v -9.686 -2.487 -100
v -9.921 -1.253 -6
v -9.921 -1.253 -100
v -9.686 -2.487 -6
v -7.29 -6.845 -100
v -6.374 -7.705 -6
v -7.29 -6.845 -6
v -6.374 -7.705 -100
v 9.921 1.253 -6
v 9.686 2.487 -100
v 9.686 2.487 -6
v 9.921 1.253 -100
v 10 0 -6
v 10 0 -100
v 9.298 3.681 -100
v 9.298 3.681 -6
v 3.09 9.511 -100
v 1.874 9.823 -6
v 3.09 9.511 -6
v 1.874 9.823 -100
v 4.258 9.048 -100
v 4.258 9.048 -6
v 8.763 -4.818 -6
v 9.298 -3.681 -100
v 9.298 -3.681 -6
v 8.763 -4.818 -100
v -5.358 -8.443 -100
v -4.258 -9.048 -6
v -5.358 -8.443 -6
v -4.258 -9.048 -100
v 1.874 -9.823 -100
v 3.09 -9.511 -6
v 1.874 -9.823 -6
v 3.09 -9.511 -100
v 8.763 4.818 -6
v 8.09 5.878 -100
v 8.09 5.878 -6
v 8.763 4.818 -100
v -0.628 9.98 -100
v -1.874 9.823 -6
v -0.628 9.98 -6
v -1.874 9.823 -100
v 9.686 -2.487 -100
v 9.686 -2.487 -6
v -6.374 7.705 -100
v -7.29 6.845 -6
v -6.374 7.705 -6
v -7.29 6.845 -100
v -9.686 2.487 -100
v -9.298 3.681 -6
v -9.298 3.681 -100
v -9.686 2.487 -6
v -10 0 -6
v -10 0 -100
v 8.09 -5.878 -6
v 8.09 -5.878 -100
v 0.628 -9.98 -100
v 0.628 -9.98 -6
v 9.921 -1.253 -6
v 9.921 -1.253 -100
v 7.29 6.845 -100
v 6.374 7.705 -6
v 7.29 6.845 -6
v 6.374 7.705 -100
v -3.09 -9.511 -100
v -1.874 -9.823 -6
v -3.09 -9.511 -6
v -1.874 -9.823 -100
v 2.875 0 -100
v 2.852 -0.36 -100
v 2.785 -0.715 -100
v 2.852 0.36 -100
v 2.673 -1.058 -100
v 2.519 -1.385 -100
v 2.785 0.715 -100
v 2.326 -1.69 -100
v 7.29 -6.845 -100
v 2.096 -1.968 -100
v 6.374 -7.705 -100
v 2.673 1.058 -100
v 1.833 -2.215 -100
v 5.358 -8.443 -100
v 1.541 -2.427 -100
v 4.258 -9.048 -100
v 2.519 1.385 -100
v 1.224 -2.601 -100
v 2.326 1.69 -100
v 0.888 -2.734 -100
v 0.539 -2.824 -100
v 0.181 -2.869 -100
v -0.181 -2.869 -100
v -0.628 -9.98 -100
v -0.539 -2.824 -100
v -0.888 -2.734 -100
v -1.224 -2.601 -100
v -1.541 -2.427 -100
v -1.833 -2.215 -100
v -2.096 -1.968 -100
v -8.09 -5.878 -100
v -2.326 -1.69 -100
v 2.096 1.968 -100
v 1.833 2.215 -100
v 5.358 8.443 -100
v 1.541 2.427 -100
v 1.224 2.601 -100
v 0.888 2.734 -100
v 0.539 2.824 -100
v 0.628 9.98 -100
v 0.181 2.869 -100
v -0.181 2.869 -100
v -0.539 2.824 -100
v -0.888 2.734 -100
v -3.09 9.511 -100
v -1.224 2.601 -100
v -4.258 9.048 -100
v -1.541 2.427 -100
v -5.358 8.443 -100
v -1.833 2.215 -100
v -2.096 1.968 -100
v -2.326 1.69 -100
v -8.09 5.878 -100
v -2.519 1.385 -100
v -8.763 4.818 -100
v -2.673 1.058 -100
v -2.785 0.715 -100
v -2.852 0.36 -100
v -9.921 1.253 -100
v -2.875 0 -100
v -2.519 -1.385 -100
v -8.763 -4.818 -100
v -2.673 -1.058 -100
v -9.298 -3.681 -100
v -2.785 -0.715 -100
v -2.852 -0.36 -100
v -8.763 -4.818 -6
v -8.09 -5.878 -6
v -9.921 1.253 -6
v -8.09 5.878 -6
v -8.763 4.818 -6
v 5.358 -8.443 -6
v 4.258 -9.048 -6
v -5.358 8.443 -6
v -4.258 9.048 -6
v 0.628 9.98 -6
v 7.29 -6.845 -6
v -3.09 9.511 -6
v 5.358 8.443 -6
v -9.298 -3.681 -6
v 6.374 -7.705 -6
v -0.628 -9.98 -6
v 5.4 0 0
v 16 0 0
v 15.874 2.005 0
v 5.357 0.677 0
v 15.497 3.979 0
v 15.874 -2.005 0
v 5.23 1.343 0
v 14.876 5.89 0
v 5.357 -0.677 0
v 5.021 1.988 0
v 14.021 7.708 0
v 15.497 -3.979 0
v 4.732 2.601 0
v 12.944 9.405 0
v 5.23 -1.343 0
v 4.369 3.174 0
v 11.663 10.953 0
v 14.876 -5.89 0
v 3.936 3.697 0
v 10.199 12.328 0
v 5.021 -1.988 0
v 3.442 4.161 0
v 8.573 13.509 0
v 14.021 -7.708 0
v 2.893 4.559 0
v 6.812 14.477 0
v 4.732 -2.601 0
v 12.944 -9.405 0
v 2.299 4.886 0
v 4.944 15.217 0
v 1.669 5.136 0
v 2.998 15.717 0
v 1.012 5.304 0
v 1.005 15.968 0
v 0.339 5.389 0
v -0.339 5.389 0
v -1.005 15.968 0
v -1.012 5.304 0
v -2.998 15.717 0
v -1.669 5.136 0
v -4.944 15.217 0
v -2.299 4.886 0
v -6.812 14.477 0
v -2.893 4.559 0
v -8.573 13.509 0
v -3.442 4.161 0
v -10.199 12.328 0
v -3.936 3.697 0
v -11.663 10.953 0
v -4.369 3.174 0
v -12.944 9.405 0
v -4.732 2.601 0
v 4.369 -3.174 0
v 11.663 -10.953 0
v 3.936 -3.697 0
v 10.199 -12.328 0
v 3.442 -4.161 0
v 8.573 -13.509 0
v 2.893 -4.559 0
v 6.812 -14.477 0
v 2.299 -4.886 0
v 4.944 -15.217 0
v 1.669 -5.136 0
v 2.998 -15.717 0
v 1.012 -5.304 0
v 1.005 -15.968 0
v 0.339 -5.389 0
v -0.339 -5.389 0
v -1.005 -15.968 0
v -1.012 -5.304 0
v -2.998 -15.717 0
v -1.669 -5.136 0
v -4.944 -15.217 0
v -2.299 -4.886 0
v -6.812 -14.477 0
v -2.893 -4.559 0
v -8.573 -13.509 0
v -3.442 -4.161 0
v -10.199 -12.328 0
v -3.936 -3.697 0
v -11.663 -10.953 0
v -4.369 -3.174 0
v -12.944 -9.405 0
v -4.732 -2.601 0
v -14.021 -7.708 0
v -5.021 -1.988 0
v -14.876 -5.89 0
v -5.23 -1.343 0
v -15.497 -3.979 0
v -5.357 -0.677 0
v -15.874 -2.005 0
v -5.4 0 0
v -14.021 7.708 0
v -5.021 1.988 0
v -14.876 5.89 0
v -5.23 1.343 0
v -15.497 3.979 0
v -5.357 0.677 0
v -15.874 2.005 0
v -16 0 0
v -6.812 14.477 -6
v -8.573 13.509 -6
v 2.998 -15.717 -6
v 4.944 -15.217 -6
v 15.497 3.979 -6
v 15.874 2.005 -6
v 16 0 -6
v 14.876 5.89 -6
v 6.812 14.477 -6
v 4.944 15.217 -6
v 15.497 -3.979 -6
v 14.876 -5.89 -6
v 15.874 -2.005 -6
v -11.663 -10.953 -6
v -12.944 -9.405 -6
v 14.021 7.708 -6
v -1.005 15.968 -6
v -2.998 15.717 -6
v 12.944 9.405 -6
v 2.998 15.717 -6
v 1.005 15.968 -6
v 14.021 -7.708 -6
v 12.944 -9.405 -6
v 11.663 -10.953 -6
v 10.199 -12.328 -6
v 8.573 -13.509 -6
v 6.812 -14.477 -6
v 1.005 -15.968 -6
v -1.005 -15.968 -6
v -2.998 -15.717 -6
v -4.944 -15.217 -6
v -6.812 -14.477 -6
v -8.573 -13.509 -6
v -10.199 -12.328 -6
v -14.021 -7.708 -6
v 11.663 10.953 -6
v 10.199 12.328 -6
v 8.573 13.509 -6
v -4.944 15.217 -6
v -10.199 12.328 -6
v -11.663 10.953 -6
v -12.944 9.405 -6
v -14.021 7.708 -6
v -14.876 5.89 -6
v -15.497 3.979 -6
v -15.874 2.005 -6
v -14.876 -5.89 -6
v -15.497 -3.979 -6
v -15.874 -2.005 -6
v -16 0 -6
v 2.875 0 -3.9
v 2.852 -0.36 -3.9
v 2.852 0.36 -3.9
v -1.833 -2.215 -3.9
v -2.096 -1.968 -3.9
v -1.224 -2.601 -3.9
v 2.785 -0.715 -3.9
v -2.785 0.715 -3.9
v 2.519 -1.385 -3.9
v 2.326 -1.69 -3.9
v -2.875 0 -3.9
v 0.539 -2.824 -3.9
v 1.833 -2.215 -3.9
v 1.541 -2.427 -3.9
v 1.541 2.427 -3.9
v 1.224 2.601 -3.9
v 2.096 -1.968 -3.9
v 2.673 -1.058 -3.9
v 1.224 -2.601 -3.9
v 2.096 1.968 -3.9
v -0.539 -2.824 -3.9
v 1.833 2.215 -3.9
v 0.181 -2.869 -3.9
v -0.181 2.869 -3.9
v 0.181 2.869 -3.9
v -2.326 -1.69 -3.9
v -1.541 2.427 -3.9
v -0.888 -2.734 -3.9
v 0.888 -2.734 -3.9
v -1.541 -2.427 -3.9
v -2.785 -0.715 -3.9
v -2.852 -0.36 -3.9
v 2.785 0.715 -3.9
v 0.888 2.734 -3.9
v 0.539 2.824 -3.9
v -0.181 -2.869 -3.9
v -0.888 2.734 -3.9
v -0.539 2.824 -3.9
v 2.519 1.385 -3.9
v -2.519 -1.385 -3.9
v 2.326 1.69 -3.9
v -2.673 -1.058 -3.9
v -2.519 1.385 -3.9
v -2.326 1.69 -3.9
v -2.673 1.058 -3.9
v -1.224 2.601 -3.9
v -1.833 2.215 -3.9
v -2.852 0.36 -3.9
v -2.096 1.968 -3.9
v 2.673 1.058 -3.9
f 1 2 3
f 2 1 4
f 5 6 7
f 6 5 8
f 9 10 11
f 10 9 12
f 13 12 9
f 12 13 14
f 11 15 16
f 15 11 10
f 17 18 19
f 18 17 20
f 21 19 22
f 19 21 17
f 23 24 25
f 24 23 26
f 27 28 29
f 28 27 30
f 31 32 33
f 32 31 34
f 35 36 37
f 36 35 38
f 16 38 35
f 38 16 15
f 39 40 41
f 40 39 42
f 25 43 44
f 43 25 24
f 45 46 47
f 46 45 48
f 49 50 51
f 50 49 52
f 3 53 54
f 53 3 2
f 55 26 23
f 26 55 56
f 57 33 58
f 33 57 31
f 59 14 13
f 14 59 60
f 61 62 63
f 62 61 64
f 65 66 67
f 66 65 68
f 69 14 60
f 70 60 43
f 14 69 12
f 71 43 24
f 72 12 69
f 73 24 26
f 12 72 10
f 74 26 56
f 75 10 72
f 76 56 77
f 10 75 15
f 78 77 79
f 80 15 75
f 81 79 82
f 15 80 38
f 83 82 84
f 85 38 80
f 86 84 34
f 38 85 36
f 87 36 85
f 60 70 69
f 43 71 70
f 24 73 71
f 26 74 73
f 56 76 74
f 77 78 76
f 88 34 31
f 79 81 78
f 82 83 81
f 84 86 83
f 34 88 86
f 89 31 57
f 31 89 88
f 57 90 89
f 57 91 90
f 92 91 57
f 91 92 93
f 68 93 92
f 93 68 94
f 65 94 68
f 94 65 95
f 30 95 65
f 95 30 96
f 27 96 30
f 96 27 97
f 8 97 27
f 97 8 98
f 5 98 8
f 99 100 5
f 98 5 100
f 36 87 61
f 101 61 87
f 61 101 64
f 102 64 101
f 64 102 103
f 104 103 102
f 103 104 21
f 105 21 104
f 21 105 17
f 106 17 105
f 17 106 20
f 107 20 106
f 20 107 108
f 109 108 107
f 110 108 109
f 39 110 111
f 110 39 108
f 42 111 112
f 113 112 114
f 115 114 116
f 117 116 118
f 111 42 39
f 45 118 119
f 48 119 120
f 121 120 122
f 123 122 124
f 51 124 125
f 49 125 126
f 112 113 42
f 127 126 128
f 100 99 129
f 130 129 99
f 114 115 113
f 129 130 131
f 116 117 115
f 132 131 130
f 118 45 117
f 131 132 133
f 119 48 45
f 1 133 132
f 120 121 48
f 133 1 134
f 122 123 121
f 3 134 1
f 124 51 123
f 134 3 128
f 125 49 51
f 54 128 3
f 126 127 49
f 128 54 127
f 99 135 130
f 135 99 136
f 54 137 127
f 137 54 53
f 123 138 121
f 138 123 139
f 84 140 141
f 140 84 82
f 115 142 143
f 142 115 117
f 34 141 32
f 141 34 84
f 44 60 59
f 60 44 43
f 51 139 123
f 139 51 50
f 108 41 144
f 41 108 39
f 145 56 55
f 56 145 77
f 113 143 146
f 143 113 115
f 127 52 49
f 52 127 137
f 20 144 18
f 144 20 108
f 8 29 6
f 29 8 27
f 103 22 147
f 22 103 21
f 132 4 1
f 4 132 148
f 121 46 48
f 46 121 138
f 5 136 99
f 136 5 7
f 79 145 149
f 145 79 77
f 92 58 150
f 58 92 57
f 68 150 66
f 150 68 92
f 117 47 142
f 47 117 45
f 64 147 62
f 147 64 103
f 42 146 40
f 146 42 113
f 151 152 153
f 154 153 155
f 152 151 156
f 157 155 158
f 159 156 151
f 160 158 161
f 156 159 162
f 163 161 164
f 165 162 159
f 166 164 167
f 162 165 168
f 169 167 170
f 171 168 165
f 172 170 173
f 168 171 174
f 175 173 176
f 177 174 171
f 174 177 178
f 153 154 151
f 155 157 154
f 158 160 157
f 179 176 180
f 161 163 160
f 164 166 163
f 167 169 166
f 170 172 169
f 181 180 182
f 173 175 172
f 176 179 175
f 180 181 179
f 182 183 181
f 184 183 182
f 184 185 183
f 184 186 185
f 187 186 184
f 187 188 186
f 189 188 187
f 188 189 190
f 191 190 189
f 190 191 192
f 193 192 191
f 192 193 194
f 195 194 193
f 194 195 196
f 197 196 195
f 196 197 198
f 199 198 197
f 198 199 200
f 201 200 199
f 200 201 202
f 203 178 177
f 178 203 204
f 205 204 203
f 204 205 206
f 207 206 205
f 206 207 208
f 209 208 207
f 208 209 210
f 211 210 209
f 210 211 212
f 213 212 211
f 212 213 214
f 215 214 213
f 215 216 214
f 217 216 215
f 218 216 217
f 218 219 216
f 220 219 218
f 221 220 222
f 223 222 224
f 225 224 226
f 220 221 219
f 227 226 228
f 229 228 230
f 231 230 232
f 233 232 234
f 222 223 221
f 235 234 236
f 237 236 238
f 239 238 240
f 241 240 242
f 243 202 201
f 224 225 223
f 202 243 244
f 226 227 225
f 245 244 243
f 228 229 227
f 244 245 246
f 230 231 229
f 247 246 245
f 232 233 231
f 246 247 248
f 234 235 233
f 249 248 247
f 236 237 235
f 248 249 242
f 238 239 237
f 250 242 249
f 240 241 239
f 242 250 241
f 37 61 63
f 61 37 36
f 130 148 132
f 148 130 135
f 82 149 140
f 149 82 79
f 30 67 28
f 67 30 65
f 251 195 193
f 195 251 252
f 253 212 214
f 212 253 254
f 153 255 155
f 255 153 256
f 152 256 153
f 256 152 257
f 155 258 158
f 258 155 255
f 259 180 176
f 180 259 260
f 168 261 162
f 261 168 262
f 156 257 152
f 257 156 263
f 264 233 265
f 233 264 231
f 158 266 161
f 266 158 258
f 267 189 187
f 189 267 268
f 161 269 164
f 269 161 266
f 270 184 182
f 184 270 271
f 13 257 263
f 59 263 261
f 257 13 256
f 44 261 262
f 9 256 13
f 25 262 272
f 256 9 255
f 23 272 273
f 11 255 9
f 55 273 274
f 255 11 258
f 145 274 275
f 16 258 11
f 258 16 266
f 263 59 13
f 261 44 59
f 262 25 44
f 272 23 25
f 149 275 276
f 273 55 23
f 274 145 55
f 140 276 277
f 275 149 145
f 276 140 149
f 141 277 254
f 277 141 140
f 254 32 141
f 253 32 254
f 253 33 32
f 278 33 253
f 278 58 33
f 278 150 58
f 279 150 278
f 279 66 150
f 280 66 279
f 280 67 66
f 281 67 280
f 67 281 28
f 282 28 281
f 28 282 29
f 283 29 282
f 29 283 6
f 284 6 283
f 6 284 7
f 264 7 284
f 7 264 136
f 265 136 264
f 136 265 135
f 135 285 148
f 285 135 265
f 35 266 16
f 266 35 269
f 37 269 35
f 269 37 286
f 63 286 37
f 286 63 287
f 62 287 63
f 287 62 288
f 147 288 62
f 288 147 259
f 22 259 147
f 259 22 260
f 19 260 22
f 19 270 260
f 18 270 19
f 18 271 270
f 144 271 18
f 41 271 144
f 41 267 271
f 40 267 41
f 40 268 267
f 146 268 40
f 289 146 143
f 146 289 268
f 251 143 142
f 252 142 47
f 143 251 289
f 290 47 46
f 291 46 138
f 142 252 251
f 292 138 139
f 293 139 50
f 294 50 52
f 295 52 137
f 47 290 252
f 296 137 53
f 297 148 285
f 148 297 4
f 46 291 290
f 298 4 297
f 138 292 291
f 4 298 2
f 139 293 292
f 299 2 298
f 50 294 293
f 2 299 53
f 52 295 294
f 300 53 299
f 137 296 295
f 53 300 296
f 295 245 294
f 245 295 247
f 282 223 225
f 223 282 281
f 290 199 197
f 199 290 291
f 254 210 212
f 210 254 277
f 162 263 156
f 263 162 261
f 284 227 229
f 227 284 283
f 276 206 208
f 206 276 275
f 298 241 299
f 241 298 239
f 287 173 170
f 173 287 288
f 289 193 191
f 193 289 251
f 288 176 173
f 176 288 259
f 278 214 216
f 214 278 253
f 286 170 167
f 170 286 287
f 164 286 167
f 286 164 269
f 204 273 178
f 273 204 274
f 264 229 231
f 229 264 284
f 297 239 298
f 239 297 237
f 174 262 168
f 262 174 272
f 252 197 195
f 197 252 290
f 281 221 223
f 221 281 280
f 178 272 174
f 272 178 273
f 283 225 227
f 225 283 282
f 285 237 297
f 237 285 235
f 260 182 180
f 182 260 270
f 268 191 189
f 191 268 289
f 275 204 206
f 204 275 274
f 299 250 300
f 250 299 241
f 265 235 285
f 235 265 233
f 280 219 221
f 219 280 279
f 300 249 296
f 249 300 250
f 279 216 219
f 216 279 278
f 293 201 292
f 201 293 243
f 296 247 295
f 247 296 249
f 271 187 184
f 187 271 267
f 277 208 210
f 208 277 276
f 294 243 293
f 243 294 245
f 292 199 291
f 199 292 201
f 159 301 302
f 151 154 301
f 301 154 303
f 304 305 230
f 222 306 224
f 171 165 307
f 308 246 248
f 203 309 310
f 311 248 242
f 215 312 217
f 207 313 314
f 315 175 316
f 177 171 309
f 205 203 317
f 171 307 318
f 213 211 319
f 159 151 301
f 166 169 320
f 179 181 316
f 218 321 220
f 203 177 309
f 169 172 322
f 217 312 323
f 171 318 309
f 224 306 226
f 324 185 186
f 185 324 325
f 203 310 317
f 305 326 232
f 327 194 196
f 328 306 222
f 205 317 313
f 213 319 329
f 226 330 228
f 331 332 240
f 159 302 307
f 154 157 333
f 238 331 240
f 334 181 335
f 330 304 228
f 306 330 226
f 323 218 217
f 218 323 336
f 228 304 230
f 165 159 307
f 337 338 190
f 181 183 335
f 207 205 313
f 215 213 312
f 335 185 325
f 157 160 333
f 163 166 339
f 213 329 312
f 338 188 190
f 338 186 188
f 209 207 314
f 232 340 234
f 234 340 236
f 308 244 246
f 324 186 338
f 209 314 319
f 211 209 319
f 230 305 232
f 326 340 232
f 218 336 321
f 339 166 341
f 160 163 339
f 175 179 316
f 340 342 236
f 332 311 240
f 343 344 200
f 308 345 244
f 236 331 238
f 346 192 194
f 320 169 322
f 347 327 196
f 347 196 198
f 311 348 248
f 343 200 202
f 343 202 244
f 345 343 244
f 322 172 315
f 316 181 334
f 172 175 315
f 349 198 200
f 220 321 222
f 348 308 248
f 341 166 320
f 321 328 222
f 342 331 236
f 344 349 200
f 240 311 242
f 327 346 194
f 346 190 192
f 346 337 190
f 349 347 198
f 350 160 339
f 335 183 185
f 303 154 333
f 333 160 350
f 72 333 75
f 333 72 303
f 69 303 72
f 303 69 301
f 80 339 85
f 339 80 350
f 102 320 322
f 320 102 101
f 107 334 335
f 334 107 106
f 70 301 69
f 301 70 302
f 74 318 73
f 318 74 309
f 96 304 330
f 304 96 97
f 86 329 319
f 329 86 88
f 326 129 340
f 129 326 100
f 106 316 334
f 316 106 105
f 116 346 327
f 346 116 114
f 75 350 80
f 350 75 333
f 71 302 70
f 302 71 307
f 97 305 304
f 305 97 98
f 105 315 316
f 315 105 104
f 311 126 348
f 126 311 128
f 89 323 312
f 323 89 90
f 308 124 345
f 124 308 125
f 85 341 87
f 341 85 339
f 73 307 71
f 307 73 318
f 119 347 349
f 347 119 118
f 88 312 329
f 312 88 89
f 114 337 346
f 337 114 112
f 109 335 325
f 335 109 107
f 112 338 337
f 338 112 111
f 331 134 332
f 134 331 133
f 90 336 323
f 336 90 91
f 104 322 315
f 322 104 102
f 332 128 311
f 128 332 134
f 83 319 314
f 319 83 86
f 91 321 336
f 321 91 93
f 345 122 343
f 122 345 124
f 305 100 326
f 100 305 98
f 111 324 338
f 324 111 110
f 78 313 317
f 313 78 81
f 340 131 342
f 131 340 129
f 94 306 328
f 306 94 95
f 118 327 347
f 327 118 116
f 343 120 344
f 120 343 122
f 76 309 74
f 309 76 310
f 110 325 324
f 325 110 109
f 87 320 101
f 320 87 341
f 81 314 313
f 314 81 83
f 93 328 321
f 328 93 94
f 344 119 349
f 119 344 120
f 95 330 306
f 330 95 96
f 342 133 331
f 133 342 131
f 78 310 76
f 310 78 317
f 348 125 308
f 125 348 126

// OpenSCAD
$fn = 50;


difference() {
	union() {
		translate(v = [0, 0, -100.0000000000]) {
			cylinder(h = 100, r = 10.0000000000);
		}
		translate(v = [0, 0, -6.0000000000]) {
			cylinder(h = 6, r = 16.0000000000);
		}
	}
	union() {
		translate(v = [0, 0, 0]) {
			rotate(a = [0, 0, 0]) {
				difference() {
					union() {
						#translate(v = [0, 0, -100.0000000000]) {
							cylinder(h = 100, r = 2.6000000000);
						}
						#translate(v = [0, 0, -3.9000000000]) {
							cylinder(h = 3.9000000000, r = 10.0000000000, r1 = 2.8750000000, r2 = 5.4000000000);
						}
						#translate(v = [0, 0, -100.0000000000]) {
							cylinder(h = 100, r = 2.8750000000);
						}
						#translate(v = [0, 0, -100.0000000000]) {
							cylinder(h = 100, r = 2.6000000000);
						}
					}
					union();
				}
			}
		}
	}
}
